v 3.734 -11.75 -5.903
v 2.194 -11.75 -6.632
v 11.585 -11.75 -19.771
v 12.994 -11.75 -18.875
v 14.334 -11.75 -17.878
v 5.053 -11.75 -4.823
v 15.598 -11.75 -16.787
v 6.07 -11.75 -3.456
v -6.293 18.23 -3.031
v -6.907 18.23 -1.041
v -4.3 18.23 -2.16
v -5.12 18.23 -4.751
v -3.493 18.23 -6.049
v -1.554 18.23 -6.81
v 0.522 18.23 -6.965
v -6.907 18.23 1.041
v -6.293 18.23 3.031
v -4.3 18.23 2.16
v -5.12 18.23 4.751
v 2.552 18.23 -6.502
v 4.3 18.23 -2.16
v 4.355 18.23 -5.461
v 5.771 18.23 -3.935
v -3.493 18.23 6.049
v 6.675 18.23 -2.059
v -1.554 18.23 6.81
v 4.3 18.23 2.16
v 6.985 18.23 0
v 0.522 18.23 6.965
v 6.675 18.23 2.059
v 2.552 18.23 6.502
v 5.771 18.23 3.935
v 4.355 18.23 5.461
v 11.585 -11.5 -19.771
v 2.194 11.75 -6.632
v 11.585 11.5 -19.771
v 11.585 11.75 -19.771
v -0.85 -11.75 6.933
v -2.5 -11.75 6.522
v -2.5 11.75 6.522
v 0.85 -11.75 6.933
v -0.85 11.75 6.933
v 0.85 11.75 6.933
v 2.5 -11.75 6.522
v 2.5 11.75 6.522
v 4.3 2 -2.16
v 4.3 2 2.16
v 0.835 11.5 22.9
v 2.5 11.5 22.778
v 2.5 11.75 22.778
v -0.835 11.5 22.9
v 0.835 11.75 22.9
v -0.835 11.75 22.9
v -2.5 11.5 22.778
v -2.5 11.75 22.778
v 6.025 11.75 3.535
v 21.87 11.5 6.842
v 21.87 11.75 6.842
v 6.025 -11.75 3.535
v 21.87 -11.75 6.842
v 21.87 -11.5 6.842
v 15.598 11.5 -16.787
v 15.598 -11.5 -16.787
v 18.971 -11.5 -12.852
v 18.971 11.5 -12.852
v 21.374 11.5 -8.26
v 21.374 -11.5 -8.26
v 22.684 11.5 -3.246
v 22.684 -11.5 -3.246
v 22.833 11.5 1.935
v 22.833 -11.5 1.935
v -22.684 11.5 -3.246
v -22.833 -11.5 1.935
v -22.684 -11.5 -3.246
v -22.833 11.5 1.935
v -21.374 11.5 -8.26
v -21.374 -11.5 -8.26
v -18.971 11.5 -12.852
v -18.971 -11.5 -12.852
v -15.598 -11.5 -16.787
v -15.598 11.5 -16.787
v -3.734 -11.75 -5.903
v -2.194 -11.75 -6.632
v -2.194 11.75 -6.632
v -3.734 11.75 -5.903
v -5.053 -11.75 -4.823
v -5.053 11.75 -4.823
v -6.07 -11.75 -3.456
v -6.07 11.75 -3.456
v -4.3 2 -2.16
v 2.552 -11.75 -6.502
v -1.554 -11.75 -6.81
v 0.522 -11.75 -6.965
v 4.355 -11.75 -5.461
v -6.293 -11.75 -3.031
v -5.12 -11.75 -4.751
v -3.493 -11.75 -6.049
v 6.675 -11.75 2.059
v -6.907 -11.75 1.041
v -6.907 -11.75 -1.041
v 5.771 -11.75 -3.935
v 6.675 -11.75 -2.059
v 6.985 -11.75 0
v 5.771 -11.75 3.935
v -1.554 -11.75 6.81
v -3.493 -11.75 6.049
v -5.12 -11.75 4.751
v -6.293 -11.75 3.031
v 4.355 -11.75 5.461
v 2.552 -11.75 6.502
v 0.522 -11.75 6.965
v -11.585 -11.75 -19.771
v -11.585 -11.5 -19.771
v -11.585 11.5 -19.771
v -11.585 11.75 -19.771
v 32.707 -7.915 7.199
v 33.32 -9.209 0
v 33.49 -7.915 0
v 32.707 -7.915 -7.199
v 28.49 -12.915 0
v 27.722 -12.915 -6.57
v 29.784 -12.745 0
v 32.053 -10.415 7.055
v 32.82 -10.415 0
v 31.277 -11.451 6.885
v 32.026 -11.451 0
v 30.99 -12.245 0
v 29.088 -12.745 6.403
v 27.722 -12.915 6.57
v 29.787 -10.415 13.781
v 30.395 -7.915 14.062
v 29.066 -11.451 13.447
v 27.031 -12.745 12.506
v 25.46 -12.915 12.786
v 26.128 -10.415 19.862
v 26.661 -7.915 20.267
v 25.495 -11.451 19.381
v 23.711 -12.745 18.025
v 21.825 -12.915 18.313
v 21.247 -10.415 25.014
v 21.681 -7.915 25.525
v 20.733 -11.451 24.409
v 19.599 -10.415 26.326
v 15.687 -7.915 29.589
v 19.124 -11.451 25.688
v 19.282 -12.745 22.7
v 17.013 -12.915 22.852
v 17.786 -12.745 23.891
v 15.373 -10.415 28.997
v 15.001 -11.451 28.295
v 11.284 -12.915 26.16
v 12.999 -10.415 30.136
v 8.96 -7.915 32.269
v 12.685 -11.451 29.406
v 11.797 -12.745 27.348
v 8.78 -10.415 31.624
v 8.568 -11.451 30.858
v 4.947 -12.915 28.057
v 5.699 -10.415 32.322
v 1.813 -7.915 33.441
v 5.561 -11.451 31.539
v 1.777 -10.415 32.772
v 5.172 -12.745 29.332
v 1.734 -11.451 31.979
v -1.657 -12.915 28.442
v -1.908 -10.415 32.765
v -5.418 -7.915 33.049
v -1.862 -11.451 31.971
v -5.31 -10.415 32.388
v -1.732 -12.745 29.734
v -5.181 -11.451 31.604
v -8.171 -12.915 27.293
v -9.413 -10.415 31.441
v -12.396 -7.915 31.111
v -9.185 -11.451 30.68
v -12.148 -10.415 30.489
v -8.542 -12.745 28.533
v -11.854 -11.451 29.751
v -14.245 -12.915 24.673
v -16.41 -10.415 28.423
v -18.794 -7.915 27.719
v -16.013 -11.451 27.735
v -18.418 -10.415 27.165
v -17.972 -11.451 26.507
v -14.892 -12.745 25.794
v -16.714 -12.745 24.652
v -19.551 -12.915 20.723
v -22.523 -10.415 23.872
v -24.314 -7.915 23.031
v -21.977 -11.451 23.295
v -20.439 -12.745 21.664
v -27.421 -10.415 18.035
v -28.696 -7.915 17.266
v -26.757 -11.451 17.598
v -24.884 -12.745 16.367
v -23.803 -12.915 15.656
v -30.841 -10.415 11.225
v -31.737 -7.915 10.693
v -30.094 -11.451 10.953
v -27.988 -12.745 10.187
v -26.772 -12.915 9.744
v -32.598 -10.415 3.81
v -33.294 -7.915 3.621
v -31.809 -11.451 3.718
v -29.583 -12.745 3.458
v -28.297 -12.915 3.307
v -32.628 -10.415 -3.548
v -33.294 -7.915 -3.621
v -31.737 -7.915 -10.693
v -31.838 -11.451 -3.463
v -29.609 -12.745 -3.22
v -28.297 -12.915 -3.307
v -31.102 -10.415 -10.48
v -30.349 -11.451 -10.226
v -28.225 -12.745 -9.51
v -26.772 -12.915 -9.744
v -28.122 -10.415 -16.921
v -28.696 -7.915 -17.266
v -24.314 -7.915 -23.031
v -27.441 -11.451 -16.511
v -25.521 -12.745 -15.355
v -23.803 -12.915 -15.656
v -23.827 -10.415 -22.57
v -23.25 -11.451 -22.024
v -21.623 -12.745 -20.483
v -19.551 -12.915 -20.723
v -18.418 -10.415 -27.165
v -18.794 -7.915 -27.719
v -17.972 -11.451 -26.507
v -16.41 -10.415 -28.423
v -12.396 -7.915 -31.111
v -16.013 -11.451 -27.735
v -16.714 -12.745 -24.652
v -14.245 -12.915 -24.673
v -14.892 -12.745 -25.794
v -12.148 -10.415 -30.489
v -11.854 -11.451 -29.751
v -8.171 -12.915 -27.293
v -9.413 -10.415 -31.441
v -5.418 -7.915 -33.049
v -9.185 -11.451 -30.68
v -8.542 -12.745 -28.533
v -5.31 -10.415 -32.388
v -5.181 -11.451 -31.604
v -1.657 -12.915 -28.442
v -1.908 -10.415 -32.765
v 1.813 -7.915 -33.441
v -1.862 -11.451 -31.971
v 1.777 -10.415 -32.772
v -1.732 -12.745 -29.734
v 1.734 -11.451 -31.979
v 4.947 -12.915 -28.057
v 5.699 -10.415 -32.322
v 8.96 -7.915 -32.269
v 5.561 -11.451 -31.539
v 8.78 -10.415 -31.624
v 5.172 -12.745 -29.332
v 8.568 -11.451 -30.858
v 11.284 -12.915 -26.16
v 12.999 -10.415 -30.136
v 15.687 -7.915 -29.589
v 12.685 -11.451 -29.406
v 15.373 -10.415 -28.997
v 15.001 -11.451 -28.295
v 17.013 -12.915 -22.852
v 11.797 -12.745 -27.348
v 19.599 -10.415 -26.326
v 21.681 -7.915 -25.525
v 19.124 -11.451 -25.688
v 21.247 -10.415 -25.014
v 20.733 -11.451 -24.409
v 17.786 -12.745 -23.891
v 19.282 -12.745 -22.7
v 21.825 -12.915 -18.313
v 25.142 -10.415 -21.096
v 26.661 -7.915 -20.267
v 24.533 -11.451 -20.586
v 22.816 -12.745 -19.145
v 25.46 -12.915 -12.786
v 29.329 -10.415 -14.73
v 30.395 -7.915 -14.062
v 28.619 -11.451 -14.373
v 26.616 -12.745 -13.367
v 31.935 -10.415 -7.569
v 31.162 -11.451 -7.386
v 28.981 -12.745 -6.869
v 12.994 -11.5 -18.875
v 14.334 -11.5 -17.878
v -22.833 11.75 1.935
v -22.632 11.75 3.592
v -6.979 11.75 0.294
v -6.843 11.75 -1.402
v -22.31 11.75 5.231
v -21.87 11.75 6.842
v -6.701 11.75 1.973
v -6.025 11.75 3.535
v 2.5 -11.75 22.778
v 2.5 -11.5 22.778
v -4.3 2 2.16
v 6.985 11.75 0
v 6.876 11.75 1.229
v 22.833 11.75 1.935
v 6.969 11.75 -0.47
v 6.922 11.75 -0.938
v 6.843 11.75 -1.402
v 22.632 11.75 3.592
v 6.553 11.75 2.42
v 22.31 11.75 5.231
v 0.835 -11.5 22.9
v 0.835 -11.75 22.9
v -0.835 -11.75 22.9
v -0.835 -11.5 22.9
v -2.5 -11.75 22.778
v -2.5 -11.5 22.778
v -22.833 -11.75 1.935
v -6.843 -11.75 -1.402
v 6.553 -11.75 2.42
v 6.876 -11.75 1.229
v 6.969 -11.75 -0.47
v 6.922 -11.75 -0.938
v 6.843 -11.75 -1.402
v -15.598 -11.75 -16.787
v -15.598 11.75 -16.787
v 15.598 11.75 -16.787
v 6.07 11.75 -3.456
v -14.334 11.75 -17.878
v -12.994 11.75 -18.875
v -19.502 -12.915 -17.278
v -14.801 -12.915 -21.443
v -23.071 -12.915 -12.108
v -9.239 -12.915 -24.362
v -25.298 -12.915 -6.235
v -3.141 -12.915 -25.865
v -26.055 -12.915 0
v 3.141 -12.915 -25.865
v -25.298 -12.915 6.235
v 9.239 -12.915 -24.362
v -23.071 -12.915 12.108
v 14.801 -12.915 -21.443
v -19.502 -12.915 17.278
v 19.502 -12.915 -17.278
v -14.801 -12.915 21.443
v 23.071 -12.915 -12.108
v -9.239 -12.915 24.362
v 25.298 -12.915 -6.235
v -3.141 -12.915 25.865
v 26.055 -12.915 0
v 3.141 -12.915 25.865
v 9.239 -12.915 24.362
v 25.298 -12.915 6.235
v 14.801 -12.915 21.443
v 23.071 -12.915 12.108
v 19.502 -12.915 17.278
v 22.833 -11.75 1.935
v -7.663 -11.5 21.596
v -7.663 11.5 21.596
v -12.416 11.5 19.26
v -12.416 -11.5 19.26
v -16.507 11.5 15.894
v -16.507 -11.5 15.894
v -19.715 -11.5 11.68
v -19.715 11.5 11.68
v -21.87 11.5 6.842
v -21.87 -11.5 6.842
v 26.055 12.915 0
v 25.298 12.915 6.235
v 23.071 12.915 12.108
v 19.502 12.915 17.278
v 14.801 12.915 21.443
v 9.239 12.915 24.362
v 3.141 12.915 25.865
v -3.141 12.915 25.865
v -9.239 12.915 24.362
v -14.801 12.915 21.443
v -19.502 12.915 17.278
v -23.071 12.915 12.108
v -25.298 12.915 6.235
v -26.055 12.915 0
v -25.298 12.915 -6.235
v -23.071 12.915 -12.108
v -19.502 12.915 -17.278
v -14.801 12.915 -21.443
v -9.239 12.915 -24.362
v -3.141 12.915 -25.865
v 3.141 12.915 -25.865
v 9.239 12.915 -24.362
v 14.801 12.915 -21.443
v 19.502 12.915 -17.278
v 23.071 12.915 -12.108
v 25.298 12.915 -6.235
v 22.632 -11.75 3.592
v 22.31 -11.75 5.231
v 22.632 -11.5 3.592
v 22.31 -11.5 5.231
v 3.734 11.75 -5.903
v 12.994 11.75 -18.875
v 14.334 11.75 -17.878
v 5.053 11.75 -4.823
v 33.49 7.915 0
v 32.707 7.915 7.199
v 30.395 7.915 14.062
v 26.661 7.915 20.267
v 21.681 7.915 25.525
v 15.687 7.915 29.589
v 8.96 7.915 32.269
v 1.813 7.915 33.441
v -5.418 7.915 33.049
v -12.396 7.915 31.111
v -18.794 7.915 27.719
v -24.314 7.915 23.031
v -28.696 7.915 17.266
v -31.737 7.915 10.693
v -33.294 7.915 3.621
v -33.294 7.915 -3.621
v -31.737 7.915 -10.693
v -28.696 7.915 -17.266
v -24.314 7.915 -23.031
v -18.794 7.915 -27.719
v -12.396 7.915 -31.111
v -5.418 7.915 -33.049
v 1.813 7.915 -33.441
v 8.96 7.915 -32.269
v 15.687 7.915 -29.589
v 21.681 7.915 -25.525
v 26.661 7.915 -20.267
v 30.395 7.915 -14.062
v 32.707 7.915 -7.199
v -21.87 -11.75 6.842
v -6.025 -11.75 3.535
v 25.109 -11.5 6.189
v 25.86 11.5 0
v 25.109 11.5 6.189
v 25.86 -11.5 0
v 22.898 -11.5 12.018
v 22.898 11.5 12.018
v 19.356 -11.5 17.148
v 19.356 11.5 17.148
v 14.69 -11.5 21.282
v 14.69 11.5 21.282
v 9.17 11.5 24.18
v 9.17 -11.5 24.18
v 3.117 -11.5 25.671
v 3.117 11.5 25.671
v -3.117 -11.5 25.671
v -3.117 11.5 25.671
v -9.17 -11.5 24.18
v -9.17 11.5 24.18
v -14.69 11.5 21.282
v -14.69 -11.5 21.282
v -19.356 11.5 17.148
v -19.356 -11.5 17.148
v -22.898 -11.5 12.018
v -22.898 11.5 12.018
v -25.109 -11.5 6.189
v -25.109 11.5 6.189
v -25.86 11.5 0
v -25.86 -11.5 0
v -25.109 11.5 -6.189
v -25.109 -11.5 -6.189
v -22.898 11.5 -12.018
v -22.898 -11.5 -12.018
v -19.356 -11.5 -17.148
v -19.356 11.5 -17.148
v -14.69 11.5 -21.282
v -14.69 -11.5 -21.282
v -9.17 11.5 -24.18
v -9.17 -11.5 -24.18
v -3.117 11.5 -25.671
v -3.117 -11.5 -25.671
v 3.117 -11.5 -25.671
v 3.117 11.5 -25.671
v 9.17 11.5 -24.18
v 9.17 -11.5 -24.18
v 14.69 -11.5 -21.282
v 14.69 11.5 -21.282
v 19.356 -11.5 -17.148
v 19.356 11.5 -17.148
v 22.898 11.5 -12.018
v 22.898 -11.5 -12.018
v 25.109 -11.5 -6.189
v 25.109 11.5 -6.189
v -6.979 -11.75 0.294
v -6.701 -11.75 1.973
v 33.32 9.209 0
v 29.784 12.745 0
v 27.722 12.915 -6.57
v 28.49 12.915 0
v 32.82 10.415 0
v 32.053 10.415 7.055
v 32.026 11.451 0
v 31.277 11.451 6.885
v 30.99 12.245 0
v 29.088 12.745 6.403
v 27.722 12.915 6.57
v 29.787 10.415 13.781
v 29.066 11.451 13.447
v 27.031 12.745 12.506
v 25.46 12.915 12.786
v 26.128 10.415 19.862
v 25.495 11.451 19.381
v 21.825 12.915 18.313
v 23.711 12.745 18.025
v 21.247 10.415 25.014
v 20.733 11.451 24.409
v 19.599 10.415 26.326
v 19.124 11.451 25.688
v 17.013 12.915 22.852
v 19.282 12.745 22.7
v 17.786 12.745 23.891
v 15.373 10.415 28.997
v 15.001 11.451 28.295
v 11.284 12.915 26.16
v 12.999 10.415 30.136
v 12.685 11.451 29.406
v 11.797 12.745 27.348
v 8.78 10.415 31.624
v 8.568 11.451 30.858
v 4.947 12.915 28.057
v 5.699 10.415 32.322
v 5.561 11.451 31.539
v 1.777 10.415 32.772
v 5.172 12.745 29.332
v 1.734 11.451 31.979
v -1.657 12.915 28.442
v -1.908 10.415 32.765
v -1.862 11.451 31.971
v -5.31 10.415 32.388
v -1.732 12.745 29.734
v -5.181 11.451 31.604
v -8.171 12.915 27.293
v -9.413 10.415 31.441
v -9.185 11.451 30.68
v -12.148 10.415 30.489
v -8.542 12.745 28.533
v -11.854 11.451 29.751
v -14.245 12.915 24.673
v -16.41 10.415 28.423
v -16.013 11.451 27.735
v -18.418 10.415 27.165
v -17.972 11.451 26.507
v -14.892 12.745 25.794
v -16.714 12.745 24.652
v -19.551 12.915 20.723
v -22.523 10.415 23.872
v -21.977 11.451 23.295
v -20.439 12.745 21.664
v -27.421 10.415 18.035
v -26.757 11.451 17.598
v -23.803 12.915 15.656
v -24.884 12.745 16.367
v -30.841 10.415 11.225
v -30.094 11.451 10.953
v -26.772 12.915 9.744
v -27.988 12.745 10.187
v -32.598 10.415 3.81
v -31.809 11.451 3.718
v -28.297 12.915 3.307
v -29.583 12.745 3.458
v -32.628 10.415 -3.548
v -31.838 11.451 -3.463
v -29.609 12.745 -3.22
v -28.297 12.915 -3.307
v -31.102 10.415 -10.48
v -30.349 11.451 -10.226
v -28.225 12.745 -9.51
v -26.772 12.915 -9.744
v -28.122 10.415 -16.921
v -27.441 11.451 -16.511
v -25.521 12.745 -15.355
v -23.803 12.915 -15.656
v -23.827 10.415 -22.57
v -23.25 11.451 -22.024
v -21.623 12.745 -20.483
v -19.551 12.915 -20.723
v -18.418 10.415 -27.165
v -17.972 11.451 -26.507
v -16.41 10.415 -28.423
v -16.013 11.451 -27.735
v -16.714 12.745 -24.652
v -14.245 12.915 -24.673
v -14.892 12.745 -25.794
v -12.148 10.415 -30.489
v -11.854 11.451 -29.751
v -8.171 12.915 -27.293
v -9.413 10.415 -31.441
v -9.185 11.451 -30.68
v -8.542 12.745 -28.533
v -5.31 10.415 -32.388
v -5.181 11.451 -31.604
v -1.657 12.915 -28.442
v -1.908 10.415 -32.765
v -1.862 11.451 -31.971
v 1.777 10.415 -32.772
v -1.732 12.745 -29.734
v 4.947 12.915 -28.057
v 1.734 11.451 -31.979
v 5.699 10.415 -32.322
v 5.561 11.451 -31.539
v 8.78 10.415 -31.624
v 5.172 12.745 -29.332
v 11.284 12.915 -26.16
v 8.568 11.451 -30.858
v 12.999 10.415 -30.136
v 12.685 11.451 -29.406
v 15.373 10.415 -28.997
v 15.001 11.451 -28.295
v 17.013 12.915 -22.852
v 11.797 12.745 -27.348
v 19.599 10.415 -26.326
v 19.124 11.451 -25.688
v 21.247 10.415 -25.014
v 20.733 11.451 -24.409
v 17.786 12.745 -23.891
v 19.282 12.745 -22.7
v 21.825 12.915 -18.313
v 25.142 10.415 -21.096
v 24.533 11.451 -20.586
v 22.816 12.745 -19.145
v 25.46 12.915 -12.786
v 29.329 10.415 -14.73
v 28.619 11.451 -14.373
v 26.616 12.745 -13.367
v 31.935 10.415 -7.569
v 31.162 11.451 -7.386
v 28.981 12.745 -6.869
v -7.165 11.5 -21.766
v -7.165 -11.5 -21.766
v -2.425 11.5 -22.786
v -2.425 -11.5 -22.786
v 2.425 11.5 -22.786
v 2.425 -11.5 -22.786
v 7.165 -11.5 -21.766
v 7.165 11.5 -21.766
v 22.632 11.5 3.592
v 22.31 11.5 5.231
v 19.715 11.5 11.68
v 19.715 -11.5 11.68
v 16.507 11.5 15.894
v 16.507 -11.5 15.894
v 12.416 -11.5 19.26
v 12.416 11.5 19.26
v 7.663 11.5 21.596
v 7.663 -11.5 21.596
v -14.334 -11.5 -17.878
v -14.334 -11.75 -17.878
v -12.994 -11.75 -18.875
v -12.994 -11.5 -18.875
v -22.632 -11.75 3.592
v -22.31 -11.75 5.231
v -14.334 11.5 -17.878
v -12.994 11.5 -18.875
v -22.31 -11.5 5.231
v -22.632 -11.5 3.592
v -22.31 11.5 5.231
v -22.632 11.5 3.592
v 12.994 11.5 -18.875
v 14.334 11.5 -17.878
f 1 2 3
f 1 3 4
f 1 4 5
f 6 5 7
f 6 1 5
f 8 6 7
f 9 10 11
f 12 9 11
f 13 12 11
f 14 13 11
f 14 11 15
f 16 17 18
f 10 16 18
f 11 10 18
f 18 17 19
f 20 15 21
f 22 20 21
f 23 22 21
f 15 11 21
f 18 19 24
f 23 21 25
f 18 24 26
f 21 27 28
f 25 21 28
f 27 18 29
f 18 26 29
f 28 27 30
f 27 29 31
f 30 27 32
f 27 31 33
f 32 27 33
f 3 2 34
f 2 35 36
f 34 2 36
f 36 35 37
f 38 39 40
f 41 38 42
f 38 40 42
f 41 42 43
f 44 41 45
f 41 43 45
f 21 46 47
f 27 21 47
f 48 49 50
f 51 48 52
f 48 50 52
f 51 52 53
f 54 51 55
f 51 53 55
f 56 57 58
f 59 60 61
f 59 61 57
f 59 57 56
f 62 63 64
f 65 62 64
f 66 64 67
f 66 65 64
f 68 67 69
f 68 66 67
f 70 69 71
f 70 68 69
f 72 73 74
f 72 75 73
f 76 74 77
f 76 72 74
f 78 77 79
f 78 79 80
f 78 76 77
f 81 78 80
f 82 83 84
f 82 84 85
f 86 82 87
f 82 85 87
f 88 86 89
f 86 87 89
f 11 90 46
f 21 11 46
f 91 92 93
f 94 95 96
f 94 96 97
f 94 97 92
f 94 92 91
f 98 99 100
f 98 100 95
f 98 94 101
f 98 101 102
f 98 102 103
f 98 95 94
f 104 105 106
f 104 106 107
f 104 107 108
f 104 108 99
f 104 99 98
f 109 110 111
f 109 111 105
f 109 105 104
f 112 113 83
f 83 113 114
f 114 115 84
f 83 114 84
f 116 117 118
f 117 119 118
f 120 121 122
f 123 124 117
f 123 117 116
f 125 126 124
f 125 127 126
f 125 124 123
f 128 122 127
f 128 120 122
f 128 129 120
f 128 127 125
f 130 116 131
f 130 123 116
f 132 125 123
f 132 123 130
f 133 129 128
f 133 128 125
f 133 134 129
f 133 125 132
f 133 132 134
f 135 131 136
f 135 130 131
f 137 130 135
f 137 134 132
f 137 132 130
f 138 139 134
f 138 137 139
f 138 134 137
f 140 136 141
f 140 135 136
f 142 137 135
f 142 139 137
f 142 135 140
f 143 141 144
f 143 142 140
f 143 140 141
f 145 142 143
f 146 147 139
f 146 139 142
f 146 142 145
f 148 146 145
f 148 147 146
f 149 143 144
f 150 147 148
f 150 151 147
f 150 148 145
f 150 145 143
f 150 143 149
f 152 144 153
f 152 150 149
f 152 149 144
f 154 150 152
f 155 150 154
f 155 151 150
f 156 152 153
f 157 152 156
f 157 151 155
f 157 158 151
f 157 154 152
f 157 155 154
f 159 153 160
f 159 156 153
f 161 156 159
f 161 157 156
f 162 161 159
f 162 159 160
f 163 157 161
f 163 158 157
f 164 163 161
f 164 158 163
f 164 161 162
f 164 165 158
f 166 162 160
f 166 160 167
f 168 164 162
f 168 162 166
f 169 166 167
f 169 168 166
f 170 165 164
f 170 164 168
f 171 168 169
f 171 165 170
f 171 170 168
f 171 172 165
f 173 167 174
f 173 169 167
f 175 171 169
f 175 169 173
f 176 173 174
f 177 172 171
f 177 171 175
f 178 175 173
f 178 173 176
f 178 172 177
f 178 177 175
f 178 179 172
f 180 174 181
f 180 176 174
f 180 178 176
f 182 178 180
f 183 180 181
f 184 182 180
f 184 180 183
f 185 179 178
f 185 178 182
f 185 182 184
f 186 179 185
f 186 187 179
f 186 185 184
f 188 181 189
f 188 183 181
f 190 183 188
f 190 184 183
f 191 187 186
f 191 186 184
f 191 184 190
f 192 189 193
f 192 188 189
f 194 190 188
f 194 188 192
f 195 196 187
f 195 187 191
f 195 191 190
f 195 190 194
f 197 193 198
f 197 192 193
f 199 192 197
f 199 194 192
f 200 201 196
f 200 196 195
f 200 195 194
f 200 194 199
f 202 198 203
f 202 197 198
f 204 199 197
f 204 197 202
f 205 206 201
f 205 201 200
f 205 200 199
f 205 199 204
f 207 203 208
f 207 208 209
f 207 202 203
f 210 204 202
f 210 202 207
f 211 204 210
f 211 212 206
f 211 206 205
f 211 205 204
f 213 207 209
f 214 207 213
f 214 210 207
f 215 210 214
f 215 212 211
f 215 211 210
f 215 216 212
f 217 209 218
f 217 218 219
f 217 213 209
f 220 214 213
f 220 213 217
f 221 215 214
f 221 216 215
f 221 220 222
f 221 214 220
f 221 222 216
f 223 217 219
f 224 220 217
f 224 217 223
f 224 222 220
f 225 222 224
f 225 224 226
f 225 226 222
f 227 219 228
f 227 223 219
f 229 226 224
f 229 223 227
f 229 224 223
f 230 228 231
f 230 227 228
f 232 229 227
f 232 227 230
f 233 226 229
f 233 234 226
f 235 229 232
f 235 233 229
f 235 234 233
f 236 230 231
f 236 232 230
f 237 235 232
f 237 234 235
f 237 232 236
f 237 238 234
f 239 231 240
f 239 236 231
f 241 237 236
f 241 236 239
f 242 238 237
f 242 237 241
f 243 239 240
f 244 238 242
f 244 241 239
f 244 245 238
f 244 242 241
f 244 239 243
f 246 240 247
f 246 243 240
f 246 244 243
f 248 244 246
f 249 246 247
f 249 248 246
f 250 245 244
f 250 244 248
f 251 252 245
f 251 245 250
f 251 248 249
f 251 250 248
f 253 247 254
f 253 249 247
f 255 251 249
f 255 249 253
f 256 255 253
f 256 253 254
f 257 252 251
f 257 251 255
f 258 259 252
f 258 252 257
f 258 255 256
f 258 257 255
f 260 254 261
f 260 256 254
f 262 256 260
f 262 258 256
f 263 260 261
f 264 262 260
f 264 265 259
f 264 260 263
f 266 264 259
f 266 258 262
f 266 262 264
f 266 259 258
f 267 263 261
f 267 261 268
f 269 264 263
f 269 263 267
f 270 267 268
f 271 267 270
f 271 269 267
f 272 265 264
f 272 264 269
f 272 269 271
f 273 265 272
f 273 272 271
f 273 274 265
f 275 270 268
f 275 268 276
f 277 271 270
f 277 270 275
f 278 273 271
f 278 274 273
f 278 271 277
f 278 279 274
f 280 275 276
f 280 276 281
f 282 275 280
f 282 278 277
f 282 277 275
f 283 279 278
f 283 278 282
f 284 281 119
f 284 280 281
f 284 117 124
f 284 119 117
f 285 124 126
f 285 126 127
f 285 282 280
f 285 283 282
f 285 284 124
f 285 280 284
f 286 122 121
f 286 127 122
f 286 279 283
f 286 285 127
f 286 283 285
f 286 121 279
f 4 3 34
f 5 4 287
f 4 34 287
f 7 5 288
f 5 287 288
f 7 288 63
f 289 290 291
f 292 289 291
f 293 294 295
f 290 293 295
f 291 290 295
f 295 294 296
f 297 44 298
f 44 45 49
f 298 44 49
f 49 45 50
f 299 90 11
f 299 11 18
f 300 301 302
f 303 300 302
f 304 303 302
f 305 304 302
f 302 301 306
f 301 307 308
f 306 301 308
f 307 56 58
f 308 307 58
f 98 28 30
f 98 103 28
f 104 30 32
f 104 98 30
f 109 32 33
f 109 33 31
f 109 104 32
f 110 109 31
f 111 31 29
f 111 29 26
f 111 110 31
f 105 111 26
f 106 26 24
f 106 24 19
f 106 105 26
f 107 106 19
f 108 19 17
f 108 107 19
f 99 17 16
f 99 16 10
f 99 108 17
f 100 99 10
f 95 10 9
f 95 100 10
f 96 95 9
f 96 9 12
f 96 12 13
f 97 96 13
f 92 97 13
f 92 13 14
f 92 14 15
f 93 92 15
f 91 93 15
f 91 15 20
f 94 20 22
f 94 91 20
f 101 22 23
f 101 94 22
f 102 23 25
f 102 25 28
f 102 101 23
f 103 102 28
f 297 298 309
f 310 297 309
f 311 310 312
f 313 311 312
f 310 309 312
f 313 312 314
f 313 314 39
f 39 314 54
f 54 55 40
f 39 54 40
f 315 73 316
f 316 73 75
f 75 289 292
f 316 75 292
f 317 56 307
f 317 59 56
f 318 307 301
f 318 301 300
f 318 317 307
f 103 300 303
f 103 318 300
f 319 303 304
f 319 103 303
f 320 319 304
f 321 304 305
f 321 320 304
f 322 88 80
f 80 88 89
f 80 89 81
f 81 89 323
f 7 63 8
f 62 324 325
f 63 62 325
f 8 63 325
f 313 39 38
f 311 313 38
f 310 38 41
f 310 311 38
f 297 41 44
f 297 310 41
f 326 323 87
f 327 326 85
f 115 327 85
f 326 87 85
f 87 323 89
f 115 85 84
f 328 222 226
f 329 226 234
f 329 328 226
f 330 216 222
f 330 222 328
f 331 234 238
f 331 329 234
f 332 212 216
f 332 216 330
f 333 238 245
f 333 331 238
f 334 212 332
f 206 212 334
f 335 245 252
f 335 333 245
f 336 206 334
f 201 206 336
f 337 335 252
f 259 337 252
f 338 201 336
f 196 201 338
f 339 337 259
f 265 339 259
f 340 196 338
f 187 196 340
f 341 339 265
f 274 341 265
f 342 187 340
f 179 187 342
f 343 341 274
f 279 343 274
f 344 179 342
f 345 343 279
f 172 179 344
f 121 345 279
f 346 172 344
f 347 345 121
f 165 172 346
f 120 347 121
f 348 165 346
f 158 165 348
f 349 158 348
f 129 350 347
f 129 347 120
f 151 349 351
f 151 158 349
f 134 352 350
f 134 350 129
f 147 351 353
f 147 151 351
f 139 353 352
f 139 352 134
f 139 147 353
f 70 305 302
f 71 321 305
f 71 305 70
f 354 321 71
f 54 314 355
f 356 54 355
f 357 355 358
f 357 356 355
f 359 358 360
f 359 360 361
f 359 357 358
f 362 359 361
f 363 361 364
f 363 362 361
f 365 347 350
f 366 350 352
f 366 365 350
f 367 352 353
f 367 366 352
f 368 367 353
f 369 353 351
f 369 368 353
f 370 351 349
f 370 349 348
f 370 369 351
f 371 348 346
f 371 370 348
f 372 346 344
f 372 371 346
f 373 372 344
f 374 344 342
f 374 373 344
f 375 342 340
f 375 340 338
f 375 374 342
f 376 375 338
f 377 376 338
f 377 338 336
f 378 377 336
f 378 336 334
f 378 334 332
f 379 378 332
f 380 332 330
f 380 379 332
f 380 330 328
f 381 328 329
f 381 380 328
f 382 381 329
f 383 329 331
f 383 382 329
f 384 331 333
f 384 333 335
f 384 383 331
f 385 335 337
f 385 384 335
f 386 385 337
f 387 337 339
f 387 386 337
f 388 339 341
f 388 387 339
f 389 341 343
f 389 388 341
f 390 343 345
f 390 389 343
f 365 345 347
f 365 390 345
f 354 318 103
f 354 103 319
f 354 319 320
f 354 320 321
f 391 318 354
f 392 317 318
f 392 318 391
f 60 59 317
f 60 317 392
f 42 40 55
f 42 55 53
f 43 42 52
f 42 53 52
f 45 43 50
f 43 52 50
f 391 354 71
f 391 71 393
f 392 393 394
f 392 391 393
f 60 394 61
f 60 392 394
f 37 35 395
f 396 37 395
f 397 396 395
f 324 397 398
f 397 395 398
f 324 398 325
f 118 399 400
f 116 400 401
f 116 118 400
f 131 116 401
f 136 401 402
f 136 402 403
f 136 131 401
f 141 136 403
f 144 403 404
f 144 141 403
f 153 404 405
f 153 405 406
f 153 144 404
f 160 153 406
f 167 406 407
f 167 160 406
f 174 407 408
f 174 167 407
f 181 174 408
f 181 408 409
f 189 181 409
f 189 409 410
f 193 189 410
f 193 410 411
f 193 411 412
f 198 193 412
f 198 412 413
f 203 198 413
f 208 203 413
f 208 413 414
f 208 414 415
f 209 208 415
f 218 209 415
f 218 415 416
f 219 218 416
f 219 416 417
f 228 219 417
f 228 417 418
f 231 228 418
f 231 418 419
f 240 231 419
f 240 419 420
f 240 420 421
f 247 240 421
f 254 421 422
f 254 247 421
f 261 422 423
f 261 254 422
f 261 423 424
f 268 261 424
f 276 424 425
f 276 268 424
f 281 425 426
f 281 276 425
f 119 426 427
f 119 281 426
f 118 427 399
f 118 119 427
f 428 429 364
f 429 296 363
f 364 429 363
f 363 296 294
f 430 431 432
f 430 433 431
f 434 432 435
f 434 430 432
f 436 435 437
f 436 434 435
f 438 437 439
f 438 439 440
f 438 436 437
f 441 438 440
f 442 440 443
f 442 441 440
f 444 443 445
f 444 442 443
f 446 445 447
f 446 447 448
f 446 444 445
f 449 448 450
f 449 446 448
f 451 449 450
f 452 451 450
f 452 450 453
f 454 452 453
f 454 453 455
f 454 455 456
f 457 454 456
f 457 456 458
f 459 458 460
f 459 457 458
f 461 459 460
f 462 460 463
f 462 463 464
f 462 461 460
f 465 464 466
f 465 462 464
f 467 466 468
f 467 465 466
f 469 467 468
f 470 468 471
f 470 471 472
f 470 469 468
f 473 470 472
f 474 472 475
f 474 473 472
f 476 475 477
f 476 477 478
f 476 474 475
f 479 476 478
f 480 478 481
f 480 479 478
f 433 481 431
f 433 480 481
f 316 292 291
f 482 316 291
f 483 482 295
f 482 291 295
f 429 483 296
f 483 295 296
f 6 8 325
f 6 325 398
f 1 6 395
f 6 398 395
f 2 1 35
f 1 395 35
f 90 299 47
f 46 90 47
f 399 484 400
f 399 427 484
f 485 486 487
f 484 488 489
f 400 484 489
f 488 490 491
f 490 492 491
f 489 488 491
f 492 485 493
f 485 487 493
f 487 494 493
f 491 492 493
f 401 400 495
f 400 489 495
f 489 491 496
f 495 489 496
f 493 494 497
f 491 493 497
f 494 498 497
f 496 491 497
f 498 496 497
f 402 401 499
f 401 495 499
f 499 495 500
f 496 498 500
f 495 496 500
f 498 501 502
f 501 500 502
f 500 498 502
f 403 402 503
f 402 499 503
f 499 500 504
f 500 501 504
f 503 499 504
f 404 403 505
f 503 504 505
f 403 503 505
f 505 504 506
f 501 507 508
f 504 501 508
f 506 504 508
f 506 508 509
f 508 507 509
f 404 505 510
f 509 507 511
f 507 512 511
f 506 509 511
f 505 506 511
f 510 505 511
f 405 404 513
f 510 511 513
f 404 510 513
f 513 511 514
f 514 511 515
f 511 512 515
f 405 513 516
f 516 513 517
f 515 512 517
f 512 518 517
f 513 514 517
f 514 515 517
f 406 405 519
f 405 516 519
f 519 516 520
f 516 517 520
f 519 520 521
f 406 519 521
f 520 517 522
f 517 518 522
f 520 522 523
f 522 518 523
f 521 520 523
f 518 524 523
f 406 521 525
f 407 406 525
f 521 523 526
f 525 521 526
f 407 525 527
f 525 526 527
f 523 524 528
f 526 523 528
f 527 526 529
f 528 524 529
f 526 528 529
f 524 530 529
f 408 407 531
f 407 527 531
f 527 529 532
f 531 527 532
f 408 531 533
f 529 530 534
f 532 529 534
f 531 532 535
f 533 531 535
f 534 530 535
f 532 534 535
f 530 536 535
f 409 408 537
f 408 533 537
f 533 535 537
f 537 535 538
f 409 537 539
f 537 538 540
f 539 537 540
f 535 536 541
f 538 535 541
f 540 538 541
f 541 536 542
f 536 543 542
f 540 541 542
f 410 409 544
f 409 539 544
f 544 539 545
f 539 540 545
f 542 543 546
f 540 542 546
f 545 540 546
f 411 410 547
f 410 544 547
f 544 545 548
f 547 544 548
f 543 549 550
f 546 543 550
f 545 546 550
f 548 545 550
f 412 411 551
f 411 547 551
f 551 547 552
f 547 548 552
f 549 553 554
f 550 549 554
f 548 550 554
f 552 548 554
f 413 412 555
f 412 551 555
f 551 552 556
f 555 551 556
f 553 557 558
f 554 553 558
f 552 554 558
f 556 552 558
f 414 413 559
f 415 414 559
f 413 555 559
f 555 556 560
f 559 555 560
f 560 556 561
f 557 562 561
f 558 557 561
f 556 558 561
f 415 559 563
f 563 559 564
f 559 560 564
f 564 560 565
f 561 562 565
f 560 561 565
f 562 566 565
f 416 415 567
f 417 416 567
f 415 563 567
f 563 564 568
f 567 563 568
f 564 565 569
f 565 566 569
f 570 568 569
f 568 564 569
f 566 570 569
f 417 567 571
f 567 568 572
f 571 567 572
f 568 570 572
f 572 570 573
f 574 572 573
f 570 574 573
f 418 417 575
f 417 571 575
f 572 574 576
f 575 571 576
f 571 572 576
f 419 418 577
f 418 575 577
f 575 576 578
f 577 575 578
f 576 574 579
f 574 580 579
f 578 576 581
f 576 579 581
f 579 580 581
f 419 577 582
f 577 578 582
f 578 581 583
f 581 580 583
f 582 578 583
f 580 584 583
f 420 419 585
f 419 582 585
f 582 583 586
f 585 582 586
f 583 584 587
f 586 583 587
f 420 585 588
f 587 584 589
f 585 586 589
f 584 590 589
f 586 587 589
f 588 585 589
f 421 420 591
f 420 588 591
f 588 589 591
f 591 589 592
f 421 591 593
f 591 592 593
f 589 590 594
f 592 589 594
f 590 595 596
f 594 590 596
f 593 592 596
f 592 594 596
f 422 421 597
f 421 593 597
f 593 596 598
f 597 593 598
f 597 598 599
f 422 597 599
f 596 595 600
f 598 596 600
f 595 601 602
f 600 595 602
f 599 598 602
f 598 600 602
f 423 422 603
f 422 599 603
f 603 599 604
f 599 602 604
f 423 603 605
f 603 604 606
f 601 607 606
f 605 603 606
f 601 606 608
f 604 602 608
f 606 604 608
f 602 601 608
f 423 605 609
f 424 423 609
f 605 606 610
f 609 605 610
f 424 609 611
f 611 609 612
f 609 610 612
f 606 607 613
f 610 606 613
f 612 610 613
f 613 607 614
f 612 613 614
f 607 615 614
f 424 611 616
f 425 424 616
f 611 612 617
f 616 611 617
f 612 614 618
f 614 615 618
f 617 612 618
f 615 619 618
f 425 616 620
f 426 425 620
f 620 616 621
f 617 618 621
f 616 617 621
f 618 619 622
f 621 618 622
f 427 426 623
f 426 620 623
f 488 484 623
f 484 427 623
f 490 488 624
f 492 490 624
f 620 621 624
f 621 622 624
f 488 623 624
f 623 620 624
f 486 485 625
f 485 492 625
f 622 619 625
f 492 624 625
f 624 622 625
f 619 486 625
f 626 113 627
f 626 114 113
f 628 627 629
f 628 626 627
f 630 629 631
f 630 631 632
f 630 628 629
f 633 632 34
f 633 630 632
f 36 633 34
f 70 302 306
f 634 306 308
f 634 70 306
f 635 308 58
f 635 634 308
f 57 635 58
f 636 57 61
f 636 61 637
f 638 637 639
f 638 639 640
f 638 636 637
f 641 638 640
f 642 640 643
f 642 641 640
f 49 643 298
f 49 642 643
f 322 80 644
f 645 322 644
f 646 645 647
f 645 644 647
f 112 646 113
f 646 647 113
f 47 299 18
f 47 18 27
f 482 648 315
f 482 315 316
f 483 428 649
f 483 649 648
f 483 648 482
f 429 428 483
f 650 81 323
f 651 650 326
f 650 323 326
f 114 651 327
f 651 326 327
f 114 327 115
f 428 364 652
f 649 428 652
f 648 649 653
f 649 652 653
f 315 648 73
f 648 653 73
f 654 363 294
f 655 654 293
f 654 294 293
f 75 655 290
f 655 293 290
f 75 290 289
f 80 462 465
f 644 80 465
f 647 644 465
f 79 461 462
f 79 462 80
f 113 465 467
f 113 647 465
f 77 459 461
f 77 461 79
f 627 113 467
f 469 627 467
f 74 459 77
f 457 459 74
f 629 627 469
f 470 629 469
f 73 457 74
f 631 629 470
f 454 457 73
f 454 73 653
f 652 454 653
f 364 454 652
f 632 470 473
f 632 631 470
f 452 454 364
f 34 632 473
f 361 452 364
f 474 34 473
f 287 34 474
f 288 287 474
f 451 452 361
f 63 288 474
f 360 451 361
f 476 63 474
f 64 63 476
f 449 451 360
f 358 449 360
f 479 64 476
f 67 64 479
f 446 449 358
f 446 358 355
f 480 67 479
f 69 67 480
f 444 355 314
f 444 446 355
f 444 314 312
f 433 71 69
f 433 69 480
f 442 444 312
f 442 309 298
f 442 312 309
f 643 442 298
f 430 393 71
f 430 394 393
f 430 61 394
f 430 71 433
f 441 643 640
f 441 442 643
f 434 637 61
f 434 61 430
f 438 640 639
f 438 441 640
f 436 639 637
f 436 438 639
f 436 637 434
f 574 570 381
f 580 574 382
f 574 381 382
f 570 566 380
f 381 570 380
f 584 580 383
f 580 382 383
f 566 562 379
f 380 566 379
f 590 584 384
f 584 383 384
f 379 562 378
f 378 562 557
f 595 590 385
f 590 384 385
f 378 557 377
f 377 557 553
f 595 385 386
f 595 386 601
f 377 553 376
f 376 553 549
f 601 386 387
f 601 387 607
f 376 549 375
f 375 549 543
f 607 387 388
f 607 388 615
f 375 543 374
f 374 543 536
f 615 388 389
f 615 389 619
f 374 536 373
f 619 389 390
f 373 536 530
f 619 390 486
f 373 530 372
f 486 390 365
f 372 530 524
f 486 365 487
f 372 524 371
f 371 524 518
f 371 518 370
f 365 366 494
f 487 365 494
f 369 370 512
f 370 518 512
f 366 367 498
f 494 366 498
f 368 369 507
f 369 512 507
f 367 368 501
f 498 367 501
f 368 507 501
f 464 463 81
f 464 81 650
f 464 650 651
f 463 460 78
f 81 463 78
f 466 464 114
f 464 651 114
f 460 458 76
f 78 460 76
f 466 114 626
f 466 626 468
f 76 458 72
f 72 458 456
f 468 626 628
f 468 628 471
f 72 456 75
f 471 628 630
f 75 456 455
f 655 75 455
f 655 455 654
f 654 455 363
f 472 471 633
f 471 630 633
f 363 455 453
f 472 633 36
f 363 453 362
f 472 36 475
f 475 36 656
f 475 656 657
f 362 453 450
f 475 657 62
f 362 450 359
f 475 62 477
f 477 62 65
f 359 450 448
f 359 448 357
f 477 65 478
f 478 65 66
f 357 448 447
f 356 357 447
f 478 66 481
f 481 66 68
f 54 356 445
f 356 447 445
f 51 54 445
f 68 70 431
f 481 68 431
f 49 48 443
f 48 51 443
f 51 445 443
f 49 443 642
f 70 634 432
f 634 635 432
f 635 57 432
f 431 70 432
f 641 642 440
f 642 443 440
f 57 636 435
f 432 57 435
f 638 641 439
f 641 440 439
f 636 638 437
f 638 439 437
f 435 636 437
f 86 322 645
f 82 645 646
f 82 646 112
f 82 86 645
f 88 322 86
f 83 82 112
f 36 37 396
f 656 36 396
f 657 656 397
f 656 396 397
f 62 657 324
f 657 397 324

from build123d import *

# Parameters (mm, degrees)
F0_R      = 33.49
F0_R_2    = 26.055
F1_DEPTH  = 12.915
F2_R      = 25.86
F2_R_2    = 22.915
F3_DEPTH  = 11.5
F5_DEPTH  = 11.75
F6_R      = 6.985
F6_W      = 8.6001232266
F6_H      = 4.32
F7_DEPTH  = 11.75
F8_DEPTH  = 18.23
F9_DEPTH  = 11.75
F10_DEPTH = 2
F11_R     = 5


with BuildPart() as f1:
    # F0 (on Front) → F1 (new body, symmetric)
    with BuildSketch(Plane.XZ):
        Circle(F0_R)
        Circle(F0_R_2, mode=Mode.SUBTRACT)
    extrude(amount=F1_DEPTH, both=True)

    # F11
    f11_edges = [f1.edges().sort_by_distance(p)[0] for p in [
        (-33.49, -12.915, 0),
        (-33.49, 12.915, 0),
    ]]
    fillet(f11_edges, radius=F11_R)


with BuildPart() as f3:
    # F2 (on Front) → F3 (new body, symmetric)
    with BuildSketch(Plane.XZ):
        Circle(F2_R)
        Circle(F2_R_2, mode=Mode.SUBTRACT)
    extrude(amount=F3_DEPTH, both=True)

    # F4 (on Front) → F5 (join, symmetric)
    with BuildSketch(Plane.XZ):
        with BuildLine():
            ThreePointArc((-6.8428213669, -1.4021486159), (-6.8909925933, 1.1421234956), (-6.0245626988, 3.5348082392))
            Line((-6.0245626988, 3.5348082392), (-21.8698302466, 6.8416189595))
            ThreePointArc((-21.8698302466, 6.8416189595), (-22.4857340662, 4.4146334507), (-22.8331609913, 1.9349377623))
            Line((-22.8331609913, 1.9349377623), (-6.8428213669, -1.4021486159))
        make_face()
        with BuildLine():
            Line((-11.5847970075, -19.7709307645), (-2.1939170541, -6.6315121171))
            ThreePointArc((-2.1939170541, -6.6315121171), (-4.4265644684, -5.4033093569), (-6.070107141, -3.4560127744))
            Line((-6.070107141, -3.4560127744), (-15.5978938608, -16.7869869872))
            ThreePointArc((-15.5978938608, -16.7869869872), (-13.6729898276, -18.3887621708), (-11.5847970075, -19.7709307645))
        make_face()
        with BuildLine():
            Line((15.5978938608, -16.7869869872), (6.070107141, -3.4560127744))
            ThreePointArc((6.070107141, -3.4560127744), (4.4265644684, -5.4033093569), (2.1939170541, -6.6315121171))
            Line((2.1939170541, -6.6315121171), (11.5847970075, -19.7709307645))
            ThreePointArc((11.5847970075, -19.7709307645), (13.6729898276, -18.3887621708), (15.5978938608, -16.7869869872))
        make_face()
        with BuildLine():
            ThreePointArc((-2.5, 6.5222867922), (0, 6.985), (2.5, 6.5222867922))
            Line((2.5, 6.5222867922), (2.5, 22.7782182139))
            ThreePointArc((2.5, 22.7782182139), (0, 22.915), (-2.5, 22.7782182139))
            Line((-2.5, 22.7782182139), (-2.5, 6.5222867922))
        make_face()
        with BuildLine():
            ThreePointArc((6.0245626988, 3.5348082392), (6.7406155302, 1.8314822615), (6.985, 0))
            ThreePointArc((6.985, 0), (6.9493644403, -0.7046693382), (6.8428213669, -1.4021486159))
            Line((6.8428213669, -1.4021486159), (22.8331609913, 1.9349377623))
            ThreePointArc((22.8331609913, 1.9349377623), (22.4857340662, 4.4146334507), (21.8698302466, 6.8416189595))
            Line((21.8698302466, 6.8416189595), (6.0245626988, 3.5348082392))
        make_face()
    extrude(amount=F5_DEPTH, both=True)


with BuildPart() as f7:
    # F6 (on Front) → F7 (new body)
    with BuildSketch(Plane.XZ):
        Circle(F6_R)
        Rectangle(F6_W, F6_H, mode=Mode.SUBTRACT)
    extrude(amount=F7_DEPTH)


with BuildPart() as f8:
    # F8 (new): a face of the model
    f8_faces = [f7.part.faces().sort_by_distance(p)[0] for p in [
        (-6.7874343653, 0, 0),
    ]]
    extrude(f8_faces, amount=F8_DEPTH)


with BuildPart() as f7_1:
    add(f7.part)

    add(f8.part)  # F9 merges F8
    # F6 (on Front) → F9 (join)
    with BuildSketch(Plane.XZ):
        Rectangle(F6_W, F6_H)
    extrude(amount=F9_DEPTH)

    # F10 (add): a face of the model
    f10_faces = [f7_1.faces().sort_by_distance(p)[0] for p in [
        (0, 0, 0),
    ]]
    extrude(f10_faces, amount=F10_DEPTH)


solid = Compound([f1.part, f3.part, f7_1.part])
